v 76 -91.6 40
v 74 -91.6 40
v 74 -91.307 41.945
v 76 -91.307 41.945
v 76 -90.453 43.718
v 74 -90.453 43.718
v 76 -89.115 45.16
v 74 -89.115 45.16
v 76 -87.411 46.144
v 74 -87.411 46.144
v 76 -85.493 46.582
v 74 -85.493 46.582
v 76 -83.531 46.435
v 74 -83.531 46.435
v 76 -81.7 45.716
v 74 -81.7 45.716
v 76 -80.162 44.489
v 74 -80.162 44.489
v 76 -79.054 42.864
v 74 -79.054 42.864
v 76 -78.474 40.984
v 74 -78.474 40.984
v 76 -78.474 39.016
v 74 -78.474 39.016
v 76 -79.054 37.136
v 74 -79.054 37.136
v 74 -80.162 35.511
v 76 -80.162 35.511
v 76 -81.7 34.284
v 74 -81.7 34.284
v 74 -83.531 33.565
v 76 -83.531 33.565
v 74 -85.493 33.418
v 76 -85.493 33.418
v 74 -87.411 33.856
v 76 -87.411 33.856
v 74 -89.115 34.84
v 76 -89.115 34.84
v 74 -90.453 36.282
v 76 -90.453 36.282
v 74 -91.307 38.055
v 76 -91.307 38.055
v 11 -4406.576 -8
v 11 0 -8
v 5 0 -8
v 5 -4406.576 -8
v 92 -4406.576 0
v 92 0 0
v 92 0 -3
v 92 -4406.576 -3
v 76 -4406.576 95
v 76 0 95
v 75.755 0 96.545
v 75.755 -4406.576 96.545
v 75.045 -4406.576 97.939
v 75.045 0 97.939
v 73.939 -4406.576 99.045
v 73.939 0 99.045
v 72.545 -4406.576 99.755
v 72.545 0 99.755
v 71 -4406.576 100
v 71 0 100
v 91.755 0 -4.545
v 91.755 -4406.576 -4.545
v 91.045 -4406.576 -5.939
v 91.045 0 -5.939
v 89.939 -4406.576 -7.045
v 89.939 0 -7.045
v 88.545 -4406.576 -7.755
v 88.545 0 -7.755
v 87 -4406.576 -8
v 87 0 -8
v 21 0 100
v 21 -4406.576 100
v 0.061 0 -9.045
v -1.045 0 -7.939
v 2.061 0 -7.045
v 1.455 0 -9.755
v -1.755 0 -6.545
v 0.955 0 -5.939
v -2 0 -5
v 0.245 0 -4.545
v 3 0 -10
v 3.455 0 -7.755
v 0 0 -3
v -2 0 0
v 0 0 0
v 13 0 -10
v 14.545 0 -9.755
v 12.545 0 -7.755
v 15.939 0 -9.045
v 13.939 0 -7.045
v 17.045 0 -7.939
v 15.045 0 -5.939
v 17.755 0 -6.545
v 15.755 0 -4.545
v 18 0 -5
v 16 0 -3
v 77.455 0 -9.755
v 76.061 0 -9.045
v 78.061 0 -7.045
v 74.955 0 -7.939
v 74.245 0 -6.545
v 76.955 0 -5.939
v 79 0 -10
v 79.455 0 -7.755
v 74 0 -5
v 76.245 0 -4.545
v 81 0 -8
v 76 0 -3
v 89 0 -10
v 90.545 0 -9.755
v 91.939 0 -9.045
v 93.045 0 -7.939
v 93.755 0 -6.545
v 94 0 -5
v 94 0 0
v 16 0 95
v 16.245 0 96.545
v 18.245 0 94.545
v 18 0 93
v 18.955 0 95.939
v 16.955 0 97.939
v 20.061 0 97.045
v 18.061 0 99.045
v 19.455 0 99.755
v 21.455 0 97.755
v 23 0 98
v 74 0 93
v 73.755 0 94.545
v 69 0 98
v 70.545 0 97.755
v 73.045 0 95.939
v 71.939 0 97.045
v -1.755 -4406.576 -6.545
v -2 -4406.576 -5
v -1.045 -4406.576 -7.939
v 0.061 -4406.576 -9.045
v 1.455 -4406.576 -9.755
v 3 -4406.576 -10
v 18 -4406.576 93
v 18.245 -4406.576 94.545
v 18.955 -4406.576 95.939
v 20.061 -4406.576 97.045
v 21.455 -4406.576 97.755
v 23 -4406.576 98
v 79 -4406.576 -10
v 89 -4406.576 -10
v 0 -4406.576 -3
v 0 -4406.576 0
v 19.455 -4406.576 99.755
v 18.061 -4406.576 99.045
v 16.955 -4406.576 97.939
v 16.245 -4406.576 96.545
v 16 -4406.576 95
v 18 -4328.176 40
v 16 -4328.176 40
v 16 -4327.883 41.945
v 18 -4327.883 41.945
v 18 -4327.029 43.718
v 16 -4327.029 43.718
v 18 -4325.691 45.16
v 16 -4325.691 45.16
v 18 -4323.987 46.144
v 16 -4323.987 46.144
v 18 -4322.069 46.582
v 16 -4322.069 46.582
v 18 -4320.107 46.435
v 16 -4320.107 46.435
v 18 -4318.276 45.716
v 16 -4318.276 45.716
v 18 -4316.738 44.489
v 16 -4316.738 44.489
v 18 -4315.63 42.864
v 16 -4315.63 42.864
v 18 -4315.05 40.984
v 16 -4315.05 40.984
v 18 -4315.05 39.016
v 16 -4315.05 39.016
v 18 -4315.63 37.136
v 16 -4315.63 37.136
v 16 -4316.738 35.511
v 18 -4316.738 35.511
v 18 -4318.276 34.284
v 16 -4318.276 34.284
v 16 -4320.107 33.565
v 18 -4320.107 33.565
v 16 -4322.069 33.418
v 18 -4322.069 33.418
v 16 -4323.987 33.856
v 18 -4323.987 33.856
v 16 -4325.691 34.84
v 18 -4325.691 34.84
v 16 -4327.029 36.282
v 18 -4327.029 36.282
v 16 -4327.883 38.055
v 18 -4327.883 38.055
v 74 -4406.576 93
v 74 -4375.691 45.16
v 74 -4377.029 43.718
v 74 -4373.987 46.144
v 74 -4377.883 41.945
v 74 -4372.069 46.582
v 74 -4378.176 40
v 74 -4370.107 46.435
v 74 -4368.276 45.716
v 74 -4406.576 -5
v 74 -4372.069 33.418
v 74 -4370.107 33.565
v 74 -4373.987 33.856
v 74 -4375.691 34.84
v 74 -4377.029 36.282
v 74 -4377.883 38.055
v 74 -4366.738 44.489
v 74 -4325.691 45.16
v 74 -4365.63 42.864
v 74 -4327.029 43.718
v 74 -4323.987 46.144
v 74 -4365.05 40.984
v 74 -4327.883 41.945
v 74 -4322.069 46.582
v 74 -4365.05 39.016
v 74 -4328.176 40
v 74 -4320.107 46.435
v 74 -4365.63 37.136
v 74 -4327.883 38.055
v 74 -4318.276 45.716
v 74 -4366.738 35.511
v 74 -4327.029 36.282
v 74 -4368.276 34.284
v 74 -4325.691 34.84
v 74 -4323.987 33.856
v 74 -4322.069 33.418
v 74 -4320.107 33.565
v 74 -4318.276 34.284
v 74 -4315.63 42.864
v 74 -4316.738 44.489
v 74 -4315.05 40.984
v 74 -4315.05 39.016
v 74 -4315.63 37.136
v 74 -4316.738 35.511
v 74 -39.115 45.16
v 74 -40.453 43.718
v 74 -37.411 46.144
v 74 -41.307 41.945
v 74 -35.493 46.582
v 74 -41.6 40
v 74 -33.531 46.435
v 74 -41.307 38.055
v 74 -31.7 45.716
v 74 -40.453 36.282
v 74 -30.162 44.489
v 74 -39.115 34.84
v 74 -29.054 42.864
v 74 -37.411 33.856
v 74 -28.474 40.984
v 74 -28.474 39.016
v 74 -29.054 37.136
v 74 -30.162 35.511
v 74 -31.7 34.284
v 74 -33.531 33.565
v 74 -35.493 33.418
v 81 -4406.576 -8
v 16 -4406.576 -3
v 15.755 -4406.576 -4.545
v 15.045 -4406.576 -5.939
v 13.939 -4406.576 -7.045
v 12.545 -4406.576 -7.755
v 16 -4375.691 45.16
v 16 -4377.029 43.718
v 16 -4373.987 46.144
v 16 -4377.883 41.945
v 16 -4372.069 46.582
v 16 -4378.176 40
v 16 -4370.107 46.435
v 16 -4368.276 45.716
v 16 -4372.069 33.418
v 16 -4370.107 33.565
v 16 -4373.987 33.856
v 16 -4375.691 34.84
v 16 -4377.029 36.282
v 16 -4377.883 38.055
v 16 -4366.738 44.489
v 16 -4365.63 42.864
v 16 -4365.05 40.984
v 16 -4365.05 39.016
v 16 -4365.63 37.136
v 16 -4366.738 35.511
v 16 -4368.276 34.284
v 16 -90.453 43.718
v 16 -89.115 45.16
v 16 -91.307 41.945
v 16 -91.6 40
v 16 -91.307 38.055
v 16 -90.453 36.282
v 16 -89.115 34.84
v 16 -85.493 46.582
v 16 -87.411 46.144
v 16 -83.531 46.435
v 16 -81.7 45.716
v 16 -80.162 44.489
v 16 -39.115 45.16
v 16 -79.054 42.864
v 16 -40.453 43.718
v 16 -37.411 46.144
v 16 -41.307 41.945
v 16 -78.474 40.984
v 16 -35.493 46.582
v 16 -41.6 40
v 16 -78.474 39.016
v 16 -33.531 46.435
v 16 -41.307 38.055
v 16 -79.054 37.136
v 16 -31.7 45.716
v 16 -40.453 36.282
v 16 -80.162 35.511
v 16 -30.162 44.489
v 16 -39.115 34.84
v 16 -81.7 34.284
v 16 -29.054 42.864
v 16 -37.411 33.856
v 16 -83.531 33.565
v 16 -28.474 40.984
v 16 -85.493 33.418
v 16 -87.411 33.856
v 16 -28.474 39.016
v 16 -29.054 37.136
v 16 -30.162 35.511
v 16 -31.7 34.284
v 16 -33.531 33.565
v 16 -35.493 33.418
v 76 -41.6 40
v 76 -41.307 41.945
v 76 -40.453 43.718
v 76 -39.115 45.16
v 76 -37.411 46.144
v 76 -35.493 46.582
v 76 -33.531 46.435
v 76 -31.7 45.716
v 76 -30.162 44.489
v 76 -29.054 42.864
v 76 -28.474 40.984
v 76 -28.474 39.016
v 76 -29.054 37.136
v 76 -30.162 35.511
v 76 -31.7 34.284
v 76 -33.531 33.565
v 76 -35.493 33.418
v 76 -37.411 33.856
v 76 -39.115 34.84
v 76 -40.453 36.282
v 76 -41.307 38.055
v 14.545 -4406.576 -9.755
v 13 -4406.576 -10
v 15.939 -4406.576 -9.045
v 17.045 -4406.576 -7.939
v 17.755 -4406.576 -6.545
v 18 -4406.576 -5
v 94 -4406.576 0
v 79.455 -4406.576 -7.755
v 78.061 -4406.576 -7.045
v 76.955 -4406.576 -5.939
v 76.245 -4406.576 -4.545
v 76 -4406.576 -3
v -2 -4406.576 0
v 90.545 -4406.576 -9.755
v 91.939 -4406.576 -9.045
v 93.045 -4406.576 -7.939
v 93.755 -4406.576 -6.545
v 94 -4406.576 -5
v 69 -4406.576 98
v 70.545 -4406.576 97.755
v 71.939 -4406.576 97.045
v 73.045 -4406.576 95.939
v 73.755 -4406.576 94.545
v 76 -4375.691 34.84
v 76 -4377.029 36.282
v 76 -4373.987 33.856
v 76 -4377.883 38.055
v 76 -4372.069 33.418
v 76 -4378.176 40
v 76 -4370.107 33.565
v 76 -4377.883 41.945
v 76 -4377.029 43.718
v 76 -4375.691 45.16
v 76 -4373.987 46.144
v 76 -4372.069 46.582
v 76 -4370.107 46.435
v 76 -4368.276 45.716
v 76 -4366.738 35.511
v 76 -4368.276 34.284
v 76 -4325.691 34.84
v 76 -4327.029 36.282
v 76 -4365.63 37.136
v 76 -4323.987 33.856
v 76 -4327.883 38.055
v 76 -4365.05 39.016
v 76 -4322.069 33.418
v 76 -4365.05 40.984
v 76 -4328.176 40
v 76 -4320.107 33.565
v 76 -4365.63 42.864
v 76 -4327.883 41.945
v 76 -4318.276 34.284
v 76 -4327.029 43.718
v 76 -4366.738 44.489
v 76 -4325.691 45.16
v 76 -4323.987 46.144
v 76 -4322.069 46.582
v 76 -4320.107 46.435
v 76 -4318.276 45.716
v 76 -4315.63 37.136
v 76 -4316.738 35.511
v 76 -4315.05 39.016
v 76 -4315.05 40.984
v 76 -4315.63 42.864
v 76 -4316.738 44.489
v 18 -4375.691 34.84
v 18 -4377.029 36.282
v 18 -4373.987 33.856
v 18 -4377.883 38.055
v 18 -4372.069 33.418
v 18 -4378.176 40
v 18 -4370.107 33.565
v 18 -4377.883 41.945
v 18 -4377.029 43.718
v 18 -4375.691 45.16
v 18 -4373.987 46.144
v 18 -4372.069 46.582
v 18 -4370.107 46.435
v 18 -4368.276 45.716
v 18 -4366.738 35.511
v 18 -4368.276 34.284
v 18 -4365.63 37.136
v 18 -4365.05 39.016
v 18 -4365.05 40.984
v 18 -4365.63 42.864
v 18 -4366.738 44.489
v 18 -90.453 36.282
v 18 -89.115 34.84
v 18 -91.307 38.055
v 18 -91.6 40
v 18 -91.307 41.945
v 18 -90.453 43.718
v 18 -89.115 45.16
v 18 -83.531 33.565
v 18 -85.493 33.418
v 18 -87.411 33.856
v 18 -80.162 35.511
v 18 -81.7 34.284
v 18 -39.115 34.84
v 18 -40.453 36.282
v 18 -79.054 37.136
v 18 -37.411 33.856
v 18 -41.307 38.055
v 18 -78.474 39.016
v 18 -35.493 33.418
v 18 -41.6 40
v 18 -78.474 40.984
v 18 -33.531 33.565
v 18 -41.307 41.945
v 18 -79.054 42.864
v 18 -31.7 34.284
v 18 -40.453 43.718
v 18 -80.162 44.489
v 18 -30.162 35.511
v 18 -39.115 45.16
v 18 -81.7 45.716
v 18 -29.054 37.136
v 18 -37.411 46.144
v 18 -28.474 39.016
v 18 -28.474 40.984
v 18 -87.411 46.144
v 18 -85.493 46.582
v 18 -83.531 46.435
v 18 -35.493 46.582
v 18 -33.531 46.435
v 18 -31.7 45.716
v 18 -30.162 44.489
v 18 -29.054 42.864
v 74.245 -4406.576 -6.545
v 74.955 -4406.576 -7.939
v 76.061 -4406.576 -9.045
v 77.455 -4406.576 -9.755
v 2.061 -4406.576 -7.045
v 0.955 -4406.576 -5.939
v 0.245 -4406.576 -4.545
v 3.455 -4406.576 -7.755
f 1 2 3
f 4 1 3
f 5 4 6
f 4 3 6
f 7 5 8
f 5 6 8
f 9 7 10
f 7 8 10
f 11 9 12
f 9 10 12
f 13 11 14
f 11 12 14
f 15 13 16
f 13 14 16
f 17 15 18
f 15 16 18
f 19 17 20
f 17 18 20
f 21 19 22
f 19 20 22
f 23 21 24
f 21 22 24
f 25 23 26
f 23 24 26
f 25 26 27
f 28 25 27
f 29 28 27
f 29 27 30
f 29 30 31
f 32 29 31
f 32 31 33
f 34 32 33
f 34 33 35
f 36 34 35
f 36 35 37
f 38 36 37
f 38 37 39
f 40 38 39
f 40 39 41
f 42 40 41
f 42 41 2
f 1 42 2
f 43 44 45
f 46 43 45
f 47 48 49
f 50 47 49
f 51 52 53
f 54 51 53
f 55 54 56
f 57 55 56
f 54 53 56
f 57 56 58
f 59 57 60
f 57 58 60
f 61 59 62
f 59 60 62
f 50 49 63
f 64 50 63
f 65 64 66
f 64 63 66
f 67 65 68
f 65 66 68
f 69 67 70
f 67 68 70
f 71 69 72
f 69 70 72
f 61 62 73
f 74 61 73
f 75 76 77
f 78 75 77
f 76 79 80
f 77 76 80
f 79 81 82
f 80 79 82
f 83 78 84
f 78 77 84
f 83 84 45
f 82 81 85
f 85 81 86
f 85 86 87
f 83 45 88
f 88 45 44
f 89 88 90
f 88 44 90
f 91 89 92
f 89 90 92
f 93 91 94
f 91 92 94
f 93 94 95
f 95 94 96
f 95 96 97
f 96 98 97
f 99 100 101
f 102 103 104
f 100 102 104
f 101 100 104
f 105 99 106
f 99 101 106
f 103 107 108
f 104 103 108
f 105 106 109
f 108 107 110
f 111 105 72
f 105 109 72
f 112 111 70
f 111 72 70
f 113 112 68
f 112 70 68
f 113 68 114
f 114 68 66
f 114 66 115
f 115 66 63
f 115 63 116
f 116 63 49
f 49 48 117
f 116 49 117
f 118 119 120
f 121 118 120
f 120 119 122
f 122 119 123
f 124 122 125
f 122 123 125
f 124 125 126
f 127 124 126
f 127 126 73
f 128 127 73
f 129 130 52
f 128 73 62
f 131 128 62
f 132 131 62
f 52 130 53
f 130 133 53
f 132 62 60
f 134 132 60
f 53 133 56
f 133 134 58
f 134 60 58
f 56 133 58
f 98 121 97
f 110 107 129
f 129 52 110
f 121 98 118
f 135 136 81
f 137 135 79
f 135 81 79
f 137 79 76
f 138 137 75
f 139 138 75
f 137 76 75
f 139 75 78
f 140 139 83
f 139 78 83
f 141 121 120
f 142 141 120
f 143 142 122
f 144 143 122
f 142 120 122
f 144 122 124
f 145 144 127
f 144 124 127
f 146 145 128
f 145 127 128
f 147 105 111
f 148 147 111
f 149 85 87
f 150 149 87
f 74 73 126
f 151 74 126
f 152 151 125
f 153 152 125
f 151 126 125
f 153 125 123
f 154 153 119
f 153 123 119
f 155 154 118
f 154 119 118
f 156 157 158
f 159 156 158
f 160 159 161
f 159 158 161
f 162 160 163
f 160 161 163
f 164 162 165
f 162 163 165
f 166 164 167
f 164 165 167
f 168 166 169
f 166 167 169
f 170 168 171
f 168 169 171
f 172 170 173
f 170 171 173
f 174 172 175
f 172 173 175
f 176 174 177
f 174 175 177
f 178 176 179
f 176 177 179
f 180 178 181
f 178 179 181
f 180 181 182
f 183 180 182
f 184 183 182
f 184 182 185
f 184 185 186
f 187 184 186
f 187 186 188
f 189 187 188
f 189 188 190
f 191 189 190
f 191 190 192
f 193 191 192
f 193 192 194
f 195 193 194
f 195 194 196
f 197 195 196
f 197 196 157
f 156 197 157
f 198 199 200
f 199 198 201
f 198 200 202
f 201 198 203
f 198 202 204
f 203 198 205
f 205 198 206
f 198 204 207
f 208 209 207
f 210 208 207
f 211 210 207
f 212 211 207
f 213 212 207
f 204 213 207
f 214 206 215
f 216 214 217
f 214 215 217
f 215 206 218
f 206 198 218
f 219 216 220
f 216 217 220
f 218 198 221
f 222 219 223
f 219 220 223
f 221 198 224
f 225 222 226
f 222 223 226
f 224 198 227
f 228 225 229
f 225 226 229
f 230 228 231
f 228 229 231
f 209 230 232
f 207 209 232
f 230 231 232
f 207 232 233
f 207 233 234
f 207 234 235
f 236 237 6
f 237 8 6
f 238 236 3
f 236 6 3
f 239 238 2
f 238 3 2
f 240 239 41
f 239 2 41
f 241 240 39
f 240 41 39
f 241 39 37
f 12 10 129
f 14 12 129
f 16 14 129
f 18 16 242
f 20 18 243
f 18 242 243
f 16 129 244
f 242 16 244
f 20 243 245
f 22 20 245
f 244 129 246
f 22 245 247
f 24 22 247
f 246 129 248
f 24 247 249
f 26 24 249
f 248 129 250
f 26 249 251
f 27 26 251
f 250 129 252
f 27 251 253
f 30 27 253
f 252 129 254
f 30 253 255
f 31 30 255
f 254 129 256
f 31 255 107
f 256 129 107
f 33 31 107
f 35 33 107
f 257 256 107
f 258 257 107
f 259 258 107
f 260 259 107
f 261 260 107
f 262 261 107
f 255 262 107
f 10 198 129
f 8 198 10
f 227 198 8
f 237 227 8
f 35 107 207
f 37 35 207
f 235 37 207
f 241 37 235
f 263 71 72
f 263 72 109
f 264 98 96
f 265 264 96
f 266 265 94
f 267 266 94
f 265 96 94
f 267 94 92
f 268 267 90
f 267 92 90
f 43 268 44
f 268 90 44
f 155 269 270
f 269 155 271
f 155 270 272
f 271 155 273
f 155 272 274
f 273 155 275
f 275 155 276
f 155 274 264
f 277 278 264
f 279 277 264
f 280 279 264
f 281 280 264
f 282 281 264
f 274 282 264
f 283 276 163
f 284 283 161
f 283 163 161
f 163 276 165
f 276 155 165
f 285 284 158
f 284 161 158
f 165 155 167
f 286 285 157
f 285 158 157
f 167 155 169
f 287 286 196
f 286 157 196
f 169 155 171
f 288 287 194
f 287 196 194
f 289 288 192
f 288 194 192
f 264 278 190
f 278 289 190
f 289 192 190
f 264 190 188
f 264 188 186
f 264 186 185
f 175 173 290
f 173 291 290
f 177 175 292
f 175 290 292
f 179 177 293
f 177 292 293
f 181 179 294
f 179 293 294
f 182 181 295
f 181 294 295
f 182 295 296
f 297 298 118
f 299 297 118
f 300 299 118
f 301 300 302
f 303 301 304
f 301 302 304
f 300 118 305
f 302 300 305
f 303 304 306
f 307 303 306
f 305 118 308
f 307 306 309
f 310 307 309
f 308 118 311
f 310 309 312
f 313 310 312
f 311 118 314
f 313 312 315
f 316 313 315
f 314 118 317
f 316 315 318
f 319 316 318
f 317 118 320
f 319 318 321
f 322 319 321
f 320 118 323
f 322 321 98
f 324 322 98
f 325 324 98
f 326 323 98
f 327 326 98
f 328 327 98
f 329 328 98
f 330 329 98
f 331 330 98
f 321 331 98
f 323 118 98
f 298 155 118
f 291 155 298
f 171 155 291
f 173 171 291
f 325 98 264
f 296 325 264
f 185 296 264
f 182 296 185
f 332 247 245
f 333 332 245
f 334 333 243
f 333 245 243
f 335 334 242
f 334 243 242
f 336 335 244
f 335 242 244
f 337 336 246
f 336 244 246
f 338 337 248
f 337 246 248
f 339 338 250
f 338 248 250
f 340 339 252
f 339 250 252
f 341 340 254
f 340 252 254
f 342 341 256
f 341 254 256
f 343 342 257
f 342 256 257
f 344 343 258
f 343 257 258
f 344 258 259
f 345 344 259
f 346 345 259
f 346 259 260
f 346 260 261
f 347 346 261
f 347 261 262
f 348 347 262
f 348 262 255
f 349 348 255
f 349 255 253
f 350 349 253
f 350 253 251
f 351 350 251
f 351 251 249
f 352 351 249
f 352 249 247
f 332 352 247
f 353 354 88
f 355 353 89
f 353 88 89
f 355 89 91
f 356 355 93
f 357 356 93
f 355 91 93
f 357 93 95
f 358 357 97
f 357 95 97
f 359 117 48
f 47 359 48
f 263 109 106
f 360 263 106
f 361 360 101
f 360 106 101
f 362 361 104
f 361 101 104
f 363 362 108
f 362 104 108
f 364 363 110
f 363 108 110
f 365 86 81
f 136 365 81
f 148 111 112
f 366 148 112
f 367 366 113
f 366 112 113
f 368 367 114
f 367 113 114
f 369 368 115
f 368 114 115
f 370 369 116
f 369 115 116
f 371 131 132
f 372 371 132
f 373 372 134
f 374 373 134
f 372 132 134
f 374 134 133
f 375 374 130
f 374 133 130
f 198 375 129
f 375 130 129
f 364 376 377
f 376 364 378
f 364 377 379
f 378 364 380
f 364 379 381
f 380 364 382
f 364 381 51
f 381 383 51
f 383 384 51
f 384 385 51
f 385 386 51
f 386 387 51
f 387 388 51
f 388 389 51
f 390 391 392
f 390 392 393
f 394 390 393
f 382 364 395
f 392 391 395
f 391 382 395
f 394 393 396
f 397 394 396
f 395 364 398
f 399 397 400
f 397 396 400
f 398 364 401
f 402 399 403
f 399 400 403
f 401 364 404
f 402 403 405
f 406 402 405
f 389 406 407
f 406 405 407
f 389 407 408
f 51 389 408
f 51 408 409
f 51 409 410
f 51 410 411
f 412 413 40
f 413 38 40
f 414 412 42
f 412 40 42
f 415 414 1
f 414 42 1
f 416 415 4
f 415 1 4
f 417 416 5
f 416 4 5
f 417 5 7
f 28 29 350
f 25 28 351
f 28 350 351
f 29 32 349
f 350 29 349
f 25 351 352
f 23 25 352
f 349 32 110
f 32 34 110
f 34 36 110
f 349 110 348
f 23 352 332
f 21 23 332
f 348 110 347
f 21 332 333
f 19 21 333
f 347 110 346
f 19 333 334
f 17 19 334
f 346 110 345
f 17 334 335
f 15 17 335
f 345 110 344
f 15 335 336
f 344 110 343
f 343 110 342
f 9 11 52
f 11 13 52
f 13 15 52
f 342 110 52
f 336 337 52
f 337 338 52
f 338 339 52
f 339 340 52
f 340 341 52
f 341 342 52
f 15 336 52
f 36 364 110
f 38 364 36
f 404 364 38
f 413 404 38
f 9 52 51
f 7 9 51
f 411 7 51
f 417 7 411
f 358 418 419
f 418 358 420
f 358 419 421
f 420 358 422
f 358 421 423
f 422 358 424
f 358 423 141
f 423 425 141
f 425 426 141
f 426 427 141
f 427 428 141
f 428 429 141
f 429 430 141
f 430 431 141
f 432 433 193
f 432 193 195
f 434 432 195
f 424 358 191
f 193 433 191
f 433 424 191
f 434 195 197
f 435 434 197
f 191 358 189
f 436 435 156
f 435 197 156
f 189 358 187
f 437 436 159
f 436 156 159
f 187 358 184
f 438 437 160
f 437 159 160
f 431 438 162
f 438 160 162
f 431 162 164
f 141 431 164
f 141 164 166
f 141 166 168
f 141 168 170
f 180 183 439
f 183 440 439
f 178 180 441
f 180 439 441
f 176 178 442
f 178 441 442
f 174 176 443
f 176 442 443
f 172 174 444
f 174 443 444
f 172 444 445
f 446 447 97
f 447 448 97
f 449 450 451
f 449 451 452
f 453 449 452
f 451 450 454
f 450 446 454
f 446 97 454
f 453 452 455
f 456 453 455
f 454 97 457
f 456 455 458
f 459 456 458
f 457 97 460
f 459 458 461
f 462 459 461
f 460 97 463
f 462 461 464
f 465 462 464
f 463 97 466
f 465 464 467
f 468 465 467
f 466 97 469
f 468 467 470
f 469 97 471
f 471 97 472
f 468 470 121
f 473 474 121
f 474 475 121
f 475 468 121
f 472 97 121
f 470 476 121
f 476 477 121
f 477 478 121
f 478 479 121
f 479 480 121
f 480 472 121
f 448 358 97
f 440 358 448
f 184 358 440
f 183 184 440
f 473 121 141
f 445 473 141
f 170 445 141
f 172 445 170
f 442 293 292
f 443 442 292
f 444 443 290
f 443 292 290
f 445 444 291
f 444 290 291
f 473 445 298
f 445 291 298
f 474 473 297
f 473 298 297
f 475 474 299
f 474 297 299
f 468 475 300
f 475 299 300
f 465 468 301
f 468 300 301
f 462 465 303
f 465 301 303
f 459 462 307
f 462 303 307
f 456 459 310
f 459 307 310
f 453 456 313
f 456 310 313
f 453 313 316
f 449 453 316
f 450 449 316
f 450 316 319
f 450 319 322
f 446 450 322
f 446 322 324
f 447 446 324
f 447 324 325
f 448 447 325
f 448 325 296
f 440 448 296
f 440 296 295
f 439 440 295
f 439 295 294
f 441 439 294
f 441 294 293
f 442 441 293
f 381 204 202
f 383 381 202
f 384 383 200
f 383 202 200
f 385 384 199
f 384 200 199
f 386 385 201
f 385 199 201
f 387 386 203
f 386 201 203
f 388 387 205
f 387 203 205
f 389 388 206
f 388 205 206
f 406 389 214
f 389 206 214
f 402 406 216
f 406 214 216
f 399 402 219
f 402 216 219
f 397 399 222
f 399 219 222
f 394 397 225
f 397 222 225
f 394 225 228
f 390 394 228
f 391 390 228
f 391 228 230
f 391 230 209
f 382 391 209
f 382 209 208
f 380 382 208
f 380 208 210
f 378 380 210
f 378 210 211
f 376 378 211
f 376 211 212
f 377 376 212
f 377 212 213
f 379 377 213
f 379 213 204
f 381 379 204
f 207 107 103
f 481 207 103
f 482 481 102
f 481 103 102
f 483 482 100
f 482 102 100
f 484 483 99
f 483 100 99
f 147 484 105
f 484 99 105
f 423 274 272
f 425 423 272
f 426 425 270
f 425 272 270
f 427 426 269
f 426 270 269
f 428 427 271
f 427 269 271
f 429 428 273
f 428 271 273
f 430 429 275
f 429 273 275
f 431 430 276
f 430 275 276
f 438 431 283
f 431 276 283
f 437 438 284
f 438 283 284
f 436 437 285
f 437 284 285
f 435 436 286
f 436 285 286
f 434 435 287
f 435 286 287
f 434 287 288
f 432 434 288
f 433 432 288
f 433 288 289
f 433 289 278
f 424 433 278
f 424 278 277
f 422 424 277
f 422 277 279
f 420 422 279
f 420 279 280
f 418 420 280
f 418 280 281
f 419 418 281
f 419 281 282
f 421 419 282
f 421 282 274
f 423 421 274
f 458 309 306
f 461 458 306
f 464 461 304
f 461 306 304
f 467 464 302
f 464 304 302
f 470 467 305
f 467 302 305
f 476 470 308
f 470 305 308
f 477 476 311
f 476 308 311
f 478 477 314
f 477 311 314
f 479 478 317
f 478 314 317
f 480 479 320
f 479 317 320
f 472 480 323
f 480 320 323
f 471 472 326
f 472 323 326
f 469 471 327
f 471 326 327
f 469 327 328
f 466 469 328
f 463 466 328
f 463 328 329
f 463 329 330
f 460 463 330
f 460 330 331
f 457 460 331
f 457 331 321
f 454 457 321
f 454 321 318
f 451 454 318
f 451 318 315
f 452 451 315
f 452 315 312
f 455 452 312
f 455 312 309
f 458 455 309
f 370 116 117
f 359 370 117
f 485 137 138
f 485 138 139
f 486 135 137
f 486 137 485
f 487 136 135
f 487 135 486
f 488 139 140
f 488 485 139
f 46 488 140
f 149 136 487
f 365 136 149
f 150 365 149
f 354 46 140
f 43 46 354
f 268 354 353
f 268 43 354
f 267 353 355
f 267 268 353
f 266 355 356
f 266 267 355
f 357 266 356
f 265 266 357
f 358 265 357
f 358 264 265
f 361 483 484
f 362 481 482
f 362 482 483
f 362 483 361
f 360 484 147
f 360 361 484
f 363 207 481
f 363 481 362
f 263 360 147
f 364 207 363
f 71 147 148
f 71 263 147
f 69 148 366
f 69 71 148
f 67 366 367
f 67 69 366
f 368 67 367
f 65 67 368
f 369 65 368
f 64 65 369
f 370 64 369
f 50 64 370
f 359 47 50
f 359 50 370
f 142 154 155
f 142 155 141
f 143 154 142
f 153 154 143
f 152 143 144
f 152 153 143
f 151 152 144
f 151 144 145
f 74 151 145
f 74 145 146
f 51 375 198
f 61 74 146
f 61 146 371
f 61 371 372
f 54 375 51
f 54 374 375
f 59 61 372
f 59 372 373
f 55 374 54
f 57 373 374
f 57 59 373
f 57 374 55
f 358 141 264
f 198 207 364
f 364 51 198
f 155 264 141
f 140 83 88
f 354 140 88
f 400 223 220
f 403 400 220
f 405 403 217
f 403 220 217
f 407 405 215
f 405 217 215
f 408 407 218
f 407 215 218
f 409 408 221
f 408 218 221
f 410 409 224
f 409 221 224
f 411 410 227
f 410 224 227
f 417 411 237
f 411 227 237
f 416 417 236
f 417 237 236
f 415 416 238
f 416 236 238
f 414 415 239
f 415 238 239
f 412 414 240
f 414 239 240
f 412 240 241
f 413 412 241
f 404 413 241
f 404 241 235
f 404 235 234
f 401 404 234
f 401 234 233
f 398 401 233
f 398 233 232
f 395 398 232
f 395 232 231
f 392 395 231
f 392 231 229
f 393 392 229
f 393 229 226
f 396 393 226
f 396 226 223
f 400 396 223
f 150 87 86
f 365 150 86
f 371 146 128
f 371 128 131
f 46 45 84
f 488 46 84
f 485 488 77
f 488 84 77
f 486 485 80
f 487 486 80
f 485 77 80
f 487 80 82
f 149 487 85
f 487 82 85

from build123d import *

# Parameters (mm, degrees)
F1_DEPTH = 4406.576
F3_D     = 13.2


with BuildPart() as f1:
    # F0 (on Front) → F1 (new body)
    with BuildSketch(Plane.XZ):
        with BuildLine():
            Line((0, -3), (0, 0))
            Line((0, 0), (-2, 0))
            Line((-2, 0), (-2, -5))
            ThreePointArc((-2, -5), (-0.5355339059, -8.5355339059), (3, -10))
            Line((3, -10), (13, -10))
            ThreePointArc((13, -10), (16.5355339059, -8.5355339059), (18, -5))
            Line((18, -5), (18, 93))
            ThreePointArc((18, 93), (19.4644660941, 96.5355339059), (23, 98))
            Line((23, 98), (69, 98))
            ThreePointArc((69, 98), (72.5355339059, 96.5355339059), (74, 93))
            Line((74, 93), (74, -5))
            ThreePointArc((74, -5), (75.4644660941, -8.5355339059), (79, -10))
            Line((79, -10), (89, -10))
            ThreePointArc((89, -10), (92.5355339059, -8.5355339059), (94, -5))
            Line((94, -5), (94, 0))
            Line((94, 0), (92, 0))
            Line((92, 0), (92, -3))
            ThreePointArc((92, -3), (90.5355339059, -6.5355339059), (87, -8))
            Line((87, -8), (81, -8))
            ThreePointArc((81, -8), (77.4644660941, -6.5355339059), (76, -3))
            Line((76, -3), (76, 95))
            ThreePointArc((76, 95), (74.5355339059, 98.5355339059), (71, 100))
            Line((71, 100), (21, 100))
            ThreePointArc((21, 100), (17.4644660941, 98.5355339059), (16, 95))
            Line((16, 95), (16, -3))
            ThreePointArc((16, -3), (14.5355339059, -6.5355339059), (11, -8))
            Line((11, -8), (5, -8))
            ThreePointArc((5, -8), (1.4644660941, -6.5355339059), (0, -3))
        make_face()
    extrude(amount=F1_DEPTH)

    # F3 (through all)
    with Locations(Plane.YZ.offset(76)):
        with Locations((-4371.576, 40), (-4321.576, 40), (-85, 40), (-35, 40)):
            Hole(F3_D / 2)


solid = f1.part
